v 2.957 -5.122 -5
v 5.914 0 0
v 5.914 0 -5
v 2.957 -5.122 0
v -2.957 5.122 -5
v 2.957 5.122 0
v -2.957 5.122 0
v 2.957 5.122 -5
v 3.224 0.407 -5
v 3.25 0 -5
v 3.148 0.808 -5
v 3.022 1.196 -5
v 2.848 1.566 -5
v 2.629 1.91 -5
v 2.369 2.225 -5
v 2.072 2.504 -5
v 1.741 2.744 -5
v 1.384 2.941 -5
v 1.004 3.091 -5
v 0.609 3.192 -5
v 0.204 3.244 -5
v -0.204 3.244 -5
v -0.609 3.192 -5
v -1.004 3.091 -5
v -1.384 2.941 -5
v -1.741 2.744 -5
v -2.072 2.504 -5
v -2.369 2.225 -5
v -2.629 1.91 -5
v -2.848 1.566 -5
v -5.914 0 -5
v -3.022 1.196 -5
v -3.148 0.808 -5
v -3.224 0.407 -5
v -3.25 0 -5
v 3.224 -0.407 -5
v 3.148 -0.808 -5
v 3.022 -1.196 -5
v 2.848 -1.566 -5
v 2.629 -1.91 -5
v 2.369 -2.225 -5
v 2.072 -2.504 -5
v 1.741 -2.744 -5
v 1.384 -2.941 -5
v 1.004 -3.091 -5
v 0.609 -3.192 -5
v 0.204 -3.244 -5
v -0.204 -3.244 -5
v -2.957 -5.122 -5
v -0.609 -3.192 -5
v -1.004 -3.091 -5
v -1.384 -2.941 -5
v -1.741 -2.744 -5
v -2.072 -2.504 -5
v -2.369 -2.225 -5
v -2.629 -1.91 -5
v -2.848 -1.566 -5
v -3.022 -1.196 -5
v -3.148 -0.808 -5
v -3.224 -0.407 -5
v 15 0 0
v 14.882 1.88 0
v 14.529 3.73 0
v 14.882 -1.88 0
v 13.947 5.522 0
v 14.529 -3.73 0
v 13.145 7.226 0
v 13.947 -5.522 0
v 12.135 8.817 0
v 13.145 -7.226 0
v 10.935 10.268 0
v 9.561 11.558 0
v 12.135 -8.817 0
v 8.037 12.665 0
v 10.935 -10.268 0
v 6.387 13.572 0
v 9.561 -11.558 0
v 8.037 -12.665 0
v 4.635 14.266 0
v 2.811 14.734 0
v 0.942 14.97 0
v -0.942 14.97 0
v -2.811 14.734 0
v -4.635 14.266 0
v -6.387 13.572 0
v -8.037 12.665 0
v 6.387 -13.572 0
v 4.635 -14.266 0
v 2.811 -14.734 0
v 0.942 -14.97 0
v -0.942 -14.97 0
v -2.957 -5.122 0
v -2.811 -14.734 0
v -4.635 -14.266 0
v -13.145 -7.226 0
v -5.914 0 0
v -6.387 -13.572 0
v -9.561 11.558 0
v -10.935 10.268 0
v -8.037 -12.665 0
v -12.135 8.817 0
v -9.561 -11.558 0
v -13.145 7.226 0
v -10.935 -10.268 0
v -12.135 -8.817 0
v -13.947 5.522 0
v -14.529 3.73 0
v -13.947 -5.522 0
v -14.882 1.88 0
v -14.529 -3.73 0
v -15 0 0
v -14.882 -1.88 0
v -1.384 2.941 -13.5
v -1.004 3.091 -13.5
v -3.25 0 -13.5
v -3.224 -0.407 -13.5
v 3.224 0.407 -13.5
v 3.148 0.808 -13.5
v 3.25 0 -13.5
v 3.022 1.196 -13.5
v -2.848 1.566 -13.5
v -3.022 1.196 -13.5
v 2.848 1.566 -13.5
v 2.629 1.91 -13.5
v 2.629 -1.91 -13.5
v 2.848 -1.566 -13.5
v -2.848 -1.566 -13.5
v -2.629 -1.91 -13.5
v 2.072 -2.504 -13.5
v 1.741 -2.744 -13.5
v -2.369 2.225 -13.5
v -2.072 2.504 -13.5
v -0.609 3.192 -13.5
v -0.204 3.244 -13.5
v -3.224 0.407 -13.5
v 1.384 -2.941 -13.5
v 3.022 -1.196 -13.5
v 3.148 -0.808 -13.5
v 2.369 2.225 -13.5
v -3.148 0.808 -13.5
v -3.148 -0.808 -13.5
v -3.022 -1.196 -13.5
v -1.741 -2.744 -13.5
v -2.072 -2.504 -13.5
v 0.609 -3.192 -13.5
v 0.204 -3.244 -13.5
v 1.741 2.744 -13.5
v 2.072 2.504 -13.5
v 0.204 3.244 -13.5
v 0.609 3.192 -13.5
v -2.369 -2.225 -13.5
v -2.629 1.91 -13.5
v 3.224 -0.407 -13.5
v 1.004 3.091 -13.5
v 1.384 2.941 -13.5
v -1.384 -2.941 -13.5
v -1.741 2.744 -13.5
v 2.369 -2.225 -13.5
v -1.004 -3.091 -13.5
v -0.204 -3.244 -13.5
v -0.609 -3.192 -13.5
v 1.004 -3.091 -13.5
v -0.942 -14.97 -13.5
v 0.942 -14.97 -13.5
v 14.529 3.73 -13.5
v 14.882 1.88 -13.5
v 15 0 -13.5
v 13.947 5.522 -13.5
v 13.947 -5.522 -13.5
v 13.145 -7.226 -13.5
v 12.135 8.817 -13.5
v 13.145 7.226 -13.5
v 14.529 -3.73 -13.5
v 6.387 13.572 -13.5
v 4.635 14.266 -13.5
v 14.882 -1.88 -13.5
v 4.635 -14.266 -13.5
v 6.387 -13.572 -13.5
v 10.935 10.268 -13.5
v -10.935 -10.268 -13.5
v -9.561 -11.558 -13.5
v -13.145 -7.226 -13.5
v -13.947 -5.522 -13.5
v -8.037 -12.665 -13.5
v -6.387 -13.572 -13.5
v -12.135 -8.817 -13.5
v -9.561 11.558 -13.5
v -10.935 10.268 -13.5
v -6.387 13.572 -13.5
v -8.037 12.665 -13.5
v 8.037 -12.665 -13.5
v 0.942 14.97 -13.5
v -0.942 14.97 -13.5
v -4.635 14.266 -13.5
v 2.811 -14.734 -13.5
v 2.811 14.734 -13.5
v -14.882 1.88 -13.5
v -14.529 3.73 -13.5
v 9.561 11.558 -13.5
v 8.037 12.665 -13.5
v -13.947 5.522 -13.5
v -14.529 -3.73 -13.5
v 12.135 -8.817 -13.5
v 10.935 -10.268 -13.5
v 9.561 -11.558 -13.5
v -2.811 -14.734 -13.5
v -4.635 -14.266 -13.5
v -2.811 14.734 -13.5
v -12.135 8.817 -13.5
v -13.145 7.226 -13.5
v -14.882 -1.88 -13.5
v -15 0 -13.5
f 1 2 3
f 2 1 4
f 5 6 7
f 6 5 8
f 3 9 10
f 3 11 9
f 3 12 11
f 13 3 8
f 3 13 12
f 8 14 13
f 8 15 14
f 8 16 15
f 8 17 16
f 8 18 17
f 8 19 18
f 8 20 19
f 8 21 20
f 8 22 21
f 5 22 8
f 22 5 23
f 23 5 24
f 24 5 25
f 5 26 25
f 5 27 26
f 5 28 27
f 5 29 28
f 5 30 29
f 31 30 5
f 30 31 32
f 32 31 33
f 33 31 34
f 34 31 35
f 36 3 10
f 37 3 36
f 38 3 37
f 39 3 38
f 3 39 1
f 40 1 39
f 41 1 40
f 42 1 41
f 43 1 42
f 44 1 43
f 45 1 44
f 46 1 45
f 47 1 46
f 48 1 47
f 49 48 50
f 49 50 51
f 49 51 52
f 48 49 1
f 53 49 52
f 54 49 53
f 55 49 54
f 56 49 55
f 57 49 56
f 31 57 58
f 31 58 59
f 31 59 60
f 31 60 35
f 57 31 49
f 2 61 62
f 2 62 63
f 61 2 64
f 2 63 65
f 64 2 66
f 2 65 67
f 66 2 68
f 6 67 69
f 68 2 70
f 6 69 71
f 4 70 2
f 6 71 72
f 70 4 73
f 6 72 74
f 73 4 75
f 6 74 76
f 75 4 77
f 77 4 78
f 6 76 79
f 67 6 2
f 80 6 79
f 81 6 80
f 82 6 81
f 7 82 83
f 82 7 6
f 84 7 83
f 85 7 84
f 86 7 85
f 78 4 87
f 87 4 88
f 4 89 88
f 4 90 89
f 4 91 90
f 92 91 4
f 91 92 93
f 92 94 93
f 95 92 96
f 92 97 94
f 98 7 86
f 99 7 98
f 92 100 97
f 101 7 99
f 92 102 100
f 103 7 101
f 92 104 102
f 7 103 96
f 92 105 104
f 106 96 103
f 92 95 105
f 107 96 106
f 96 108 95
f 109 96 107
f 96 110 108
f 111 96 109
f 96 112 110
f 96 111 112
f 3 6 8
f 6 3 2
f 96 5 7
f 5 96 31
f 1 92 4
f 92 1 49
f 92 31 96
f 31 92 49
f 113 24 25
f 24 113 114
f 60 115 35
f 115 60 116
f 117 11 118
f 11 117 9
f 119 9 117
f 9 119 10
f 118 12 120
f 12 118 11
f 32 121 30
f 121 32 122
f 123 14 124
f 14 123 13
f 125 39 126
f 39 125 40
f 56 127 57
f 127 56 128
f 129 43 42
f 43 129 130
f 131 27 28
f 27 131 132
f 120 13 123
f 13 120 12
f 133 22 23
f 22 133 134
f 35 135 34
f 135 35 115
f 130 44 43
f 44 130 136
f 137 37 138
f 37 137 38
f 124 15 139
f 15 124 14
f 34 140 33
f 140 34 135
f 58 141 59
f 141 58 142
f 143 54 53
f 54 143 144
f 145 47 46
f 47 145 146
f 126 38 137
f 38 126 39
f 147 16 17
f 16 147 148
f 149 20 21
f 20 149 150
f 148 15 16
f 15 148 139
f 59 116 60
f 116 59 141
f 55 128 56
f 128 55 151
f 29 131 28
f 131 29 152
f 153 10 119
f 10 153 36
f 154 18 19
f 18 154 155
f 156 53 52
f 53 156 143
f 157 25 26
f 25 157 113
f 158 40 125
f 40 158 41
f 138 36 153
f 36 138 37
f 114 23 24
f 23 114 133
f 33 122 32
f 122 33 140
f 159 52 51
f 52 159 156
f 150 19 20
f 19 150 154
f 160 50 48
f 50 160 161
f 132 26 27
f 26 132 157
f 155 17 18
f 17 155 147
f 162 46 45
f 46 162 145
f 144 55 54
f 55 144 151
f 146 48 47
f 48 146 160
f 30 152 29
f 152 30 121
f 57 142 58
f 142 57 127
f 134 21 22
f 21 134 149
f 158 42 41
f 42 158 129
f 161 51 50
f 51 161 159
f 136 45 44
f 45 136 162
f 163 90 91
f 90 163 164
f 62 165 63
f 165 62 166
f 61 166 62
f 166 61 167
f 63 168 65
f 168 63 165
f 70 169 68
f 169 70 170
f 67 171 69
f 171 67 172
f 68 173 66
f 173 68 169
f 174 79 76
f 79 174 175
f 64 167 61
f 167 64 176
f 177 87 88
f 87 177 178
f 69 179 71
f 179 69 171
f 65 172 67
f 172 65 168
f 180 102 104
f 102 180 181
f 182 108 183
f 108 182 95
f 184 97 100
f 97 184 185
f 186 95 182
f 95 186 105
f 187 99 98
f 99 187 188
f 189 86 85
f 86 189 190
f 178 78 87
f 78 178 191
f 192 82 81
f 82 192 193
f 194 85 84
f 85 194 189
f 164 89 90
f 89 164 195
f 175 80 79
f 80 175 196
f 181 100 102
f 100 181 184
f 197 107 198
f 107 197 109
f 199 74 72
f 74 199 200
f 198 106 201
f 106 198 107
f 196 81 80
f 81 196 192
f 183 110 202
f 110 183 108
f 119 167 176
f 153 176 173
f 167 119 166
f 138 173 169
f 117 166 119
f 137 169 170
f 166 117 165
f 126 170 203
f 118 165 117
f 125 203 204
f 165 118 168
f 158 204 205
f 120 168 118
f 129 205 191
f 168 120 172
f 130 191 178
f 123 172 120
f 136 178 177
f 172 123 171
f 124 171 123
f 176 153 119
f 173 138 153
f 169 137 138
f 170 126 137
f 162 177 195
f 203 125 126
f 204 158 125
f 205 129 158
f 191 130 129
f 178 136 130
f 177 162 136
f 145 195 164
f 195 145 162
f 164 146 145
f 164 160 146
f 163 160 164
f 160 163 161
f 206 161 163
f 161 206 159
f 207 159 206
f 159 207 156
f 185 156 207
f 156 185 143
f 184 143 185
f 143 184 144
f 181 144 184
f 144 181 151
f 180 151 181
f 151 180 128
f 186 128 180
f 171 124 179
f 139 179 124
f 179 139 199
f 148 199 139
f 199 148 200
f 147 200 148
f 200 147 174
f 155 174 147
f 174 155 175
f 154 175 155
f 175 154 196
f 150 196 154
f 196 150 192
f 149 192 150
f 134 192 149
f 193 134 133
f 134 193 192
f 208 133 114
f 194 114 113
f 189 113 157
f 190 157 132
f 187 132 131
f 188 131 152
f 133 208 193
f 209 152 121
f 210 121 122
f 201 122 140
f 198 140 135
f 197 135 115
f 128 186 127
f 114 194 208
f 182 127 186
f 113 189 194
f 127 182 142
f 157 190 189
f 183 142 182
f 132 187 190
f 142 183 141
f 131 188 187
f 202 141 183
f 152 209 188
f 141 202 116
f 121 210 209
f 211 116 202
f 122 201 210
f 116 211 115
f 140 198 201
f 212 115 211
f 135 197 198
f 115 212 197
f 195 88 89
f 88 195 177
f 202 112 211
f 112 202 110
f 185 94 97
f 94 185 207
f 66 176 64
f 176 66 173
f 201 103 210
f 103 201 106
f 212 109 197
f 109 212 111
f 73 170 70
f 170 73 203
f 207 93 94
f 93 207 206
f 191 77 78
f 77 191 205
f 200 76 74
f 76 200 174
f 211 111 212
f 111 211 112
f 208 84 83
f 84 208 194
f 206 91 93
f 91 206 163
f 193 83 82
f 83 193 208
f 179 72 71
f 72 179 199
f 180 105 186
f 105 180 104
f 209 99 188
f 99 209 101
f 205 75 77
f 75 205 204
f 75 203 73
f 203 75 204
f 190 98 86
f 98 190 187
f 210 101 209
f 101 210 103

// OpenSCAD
$fn = 50;


difference() {
	union() {
		translate(v = [0, 0, -13.5000000000]) {
			cylinder(h = 13.5000000000, r = 15.0000000000);
		}
	}
	union() {
		translate(v = [0, 0, 0]) {
			rotate(a = [0, 0, 0]) {
				difference() {
					union() {
						translate(v = [0, 0, -5]) {
							linear_extrude(height = 5) {
								polygon(points = [[5.9142500000, 0.0000000000], [2.9571250000, 5.1218907443], [-2.9571250000, 5.1218907443], [-5.9142500000, 0.0000000000], [-2.9571250000, -5.1218907443], [2.9571250000, -5.1218907443]]);
							}
						}
					}
					union();
				}
			}
		}
		#translate(v = [0, 0, -100.0000000000]) {
			cylinder(h = 200, r = 3.2500000000);
		}
	}
}
